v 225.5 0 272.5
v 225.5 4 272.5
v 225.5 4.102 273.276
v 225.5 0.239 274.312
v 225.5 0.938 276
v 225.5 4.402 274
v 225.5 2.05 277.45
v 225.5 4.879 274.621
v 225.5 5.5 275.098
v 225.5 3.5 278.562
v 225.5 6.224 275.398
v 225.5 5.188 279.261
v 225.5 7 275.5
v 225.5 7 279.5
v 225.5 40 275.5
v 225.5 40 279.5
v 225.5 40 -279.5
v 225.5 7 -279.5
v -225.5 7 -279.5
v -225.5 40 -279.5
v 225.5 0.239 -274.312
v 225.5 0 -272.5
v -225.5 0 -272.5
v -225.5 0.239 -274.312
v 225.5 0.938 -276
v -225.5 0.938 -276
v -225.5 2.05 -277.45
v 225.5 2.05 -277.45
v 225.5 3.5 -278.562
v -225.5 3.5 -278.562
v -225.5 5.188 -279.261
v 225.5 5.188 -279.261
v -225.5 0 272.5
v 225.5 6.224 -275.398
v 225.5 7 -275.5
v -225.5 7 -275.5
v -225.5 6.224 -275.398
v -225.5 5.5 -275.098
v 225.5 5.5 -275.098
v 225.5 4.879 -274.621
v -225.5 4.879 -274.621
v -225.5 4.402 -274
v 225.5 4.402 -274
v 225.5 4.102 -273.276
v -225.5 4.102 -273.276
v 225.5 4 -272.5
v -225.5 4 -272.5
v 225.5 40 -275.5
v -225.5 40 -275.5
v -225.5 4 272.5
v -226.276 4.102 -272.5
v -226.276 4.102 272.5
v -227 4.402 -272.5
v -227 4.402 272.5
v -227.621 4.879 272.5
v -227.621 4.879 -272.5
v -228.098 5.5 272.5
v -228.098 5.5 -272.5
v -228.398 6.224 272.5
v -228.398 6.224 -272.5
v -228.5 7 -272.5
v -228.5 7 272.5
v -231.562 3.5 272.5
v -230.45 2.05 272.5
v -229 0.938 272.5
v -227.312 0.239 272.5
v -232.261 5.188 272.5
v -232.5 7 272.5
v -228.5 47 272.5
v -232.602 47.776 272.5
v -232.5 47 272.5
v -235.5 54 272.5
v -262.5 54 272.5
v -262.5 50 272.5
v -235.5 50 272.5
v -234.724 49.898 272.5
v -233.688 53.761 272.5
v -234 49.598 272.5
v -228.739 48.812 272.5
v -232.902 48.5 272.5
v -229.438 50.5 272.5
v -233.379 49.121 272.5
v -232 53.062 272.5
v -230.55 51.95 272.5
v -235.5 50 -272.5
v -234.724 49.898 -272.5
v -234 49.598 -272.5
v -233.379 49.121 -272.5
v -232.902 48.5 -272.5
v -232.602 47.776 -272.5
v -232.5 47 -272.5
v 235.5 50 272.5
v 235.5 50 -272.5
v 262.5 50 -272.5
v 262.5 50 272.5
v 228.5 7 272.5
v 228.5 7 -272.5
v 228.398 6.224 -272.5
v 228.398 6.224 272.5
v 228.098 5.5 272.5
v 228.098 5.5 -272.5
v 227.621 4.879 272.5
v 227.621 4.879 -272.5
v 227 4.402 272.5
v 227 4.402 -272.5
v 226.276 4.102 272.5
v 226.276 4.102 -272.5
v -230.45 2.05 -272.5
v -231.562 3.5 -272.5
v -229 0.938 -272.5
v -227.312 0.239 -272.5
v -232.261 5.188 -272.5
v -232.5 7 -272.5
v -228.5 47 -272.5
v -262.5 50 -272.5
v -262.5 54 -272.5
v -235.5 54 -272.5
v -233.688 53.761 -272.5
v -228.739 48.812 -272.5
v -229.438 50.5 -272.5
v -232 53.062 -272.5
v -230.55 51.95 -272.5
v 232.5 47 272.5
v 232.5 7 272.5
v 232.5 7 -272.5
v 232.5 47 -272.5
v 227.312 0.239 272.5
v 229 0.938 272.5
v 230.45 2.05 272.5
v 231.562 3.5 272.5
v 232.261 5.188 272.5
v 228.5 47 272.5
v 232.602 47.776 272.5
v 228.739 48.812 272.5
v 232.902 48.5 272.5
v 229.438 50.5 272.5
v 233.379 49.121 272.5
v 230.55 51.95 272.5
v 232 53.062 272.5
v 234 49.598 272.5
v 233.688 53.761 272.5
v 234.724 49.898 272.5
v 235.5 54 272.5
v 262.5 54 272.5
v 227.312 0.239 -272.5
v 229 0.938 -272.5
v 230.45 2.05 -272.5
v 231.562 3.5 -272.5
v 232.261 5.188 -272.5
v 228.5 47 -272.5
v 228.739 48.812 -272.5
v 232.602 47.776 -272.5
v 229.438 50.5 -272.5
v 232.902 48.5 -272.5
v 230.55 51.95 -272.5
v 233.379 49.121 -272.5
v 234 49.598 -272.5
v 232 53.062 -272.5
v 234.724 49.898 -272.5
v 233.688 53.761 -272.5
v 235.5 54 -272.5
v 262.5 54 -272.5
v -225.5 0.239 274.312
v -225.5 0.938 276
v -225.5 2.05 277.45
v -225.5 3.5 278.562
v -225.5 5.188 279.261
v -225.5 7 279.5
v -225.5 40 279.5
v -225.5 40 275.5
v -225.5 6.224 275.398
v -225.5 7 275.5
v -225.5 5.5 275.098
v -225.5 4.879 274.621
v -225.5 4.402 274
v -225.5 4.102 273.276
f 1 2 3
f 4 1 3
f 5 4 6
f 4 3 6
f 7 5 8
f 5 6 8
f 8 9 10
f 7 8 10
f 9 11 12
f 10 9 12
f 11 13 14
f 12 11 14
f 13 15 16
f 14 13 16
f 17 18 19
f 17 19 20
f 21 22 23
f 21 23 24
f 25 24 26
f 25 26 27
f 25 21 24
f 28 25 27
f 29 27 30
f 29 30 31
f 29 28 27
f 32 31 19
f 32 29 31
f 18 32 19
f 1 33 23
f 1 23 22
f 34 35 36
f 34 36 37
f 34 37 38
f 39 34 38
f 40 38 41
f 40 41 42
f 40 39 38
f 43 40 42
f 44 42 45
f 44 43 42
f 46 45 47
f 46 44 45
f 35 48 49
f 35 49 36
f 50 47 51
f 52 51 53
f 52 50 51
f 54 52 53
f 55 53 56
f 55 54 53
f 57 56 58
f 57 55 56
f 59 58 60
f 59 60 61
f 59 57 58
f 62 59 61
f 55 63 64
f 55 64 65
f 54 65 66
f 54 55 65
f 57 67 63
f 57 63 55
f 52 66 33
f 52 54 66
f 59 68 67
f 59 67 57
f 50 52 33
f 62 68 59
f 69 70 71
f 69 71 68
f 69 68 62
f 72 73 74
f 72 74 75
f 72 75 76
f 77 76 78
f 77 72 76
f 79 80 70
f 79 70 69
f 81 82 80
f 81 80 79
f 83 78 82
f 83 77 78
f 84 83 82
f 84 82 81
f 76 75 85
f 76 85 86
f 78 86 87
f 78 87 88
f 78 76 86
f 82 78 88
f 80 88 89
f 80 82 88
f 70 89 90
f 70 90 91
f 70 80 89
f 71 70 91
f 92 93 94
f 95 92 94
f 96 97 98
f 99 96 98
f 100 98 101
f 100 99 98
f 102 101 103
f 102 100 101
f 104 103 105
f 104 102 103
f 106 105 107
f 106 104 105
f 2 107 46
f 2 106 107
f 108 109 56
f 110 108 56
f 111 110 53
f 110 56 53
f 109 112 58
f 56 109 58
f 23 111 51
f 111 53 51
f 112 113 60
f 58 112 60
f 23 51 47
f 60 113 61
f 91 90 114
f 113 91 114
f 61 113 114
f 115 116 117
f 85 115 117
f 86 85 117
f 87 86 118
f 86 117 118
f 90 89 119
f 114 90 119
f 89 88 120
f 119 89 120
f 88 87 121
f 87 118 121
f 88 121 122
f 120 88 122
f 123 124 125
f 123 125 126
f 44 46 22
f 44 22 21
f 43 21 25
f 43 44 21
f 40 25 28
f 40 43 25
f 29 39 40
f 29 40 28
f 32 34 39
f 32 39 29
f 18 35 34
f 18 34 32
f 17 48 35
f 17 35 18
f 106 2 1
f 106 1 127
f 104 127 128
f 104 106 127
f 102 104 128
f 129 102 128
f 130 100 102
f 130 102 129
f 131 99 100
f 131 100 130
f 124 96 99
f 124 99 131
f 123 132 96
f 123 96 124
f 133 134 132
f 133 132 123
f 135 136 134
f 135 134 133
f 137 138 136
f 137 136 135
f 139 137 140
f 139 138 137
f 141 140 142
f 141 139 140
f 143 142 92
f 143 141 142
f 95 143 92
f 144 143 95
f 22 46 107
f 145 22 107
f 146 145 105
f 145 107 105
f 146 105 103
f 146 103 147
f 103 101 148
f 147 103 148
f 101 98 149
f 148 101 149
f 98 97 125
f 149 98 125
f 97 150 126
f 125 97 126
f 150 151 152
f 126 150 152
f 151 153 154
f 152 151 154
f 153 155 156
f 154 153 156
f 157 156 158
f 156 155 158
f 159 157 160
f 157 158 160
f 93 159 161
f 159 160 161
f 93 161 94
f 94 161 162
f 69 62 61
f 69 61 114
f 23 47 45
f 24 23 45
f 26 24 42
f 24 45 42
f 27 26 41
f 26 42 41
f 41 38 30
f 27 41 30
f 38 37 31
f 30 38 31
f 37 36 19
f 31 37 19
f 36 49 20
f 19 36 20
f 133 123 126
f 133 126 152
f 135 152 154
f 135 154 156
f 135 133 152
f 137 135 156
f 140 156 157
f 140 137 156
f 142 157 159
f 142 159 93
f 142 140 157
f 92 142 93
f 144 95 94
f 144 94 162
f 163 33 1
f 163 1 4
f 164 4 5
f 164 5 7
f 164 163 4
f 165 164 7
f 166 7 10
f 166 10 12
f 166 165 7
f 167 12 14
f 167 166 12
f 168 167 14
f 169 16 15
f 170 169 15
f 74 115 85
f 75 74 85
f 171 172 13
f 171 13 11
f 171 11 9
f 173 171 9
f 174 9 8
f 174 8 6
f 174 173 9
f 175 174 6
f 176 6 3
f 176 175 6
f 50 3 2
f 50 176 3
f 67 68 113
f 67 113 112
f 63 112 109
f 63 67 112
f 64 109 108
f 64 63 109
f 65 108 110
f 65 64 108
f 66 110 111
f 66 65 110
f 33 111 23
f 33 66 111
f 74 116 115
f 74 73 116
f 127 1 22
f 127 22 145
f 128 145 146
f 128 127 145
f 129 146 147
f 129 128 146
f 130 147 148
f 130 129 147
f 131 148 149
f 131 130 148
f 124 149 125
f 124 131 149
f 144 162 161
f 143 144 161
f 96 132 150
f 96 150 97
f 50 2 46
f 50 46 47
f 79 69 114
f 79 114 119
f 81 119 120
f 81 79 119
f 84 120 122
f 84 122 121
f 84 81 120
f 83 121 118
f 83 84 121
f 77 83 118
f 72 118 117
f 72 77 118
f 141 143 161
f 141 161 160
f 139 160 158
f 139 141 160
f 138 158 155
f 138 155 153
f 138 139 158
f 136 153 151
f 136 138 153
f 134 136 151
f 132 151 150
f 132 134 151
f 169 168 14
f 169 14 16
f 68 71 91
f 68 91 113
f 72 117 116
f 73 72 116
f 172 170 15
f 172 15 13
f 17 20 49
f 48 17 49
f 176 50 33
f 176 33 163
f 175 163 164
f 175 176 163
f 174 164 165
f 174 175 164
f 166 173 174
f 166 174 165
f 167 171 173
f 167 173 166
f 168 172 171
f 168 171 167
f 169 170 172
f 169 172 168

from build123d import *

# Parameters (mm, degrees)
BASE_FLANGIA1_DEPTH       = 272.5
BORDO_FLANGIA1_DEPTH      = 451
BORDO_FLANGIA1_BEND_DEPTH = 451


# Sheet-metal steps are written as plain solids
with BuildPart() as part:
    # Schizzo1 → Base-Flangia1 (new, symmetric)
    with BuildSketch(Plane.XY):
        with BuildLine():
            Line((-262.5, 50), (-235.5, 50))
            ThreePointArc((-235.5, 50), (-233.378679656, 49.121320344), (-232.5, 47))
            Line((-232.5, 47), (-232.5, 7))
            ThreePointArc((-232.5, 7), (-230.449747468, 2.050252532), (-225.5, 0))
            Line((-225.5, 0), (225.5, 0))
            ThreePointArc((225.5, 0), (230.449747468, 2.050252532), (232.5, 7))
            Line((232.5, 7), (232.5, 47))
            ThreePointArc((232.5, 47), (233.378679656, 49.121320344), (235.5, 50))
            Line((235.5, 50), (262.5, 50))
            Line((262.5, 50), (262.5, 54))
            Line((262.5, 54), (235.5, 54))
            ThreePointArc((235.5, 54), (230.550252532, 51.949747468), (228.5, 47))
            Line((228.5, 47), (228.5, 7))
            ThreePointArc((228.5, 7), (227.621320344, 4.878679656), (225.5, 4))
            Line((225.5, 4), (-225.5, 4))
            ThreePointArc((-225.5, 4), (-227.621320344, 4.878679656), (-228.5, 7))
            Line((-228.5, 7), (-228.5, 47))
            ThreePointArc((-228.5, 47), (-230.550252532, 51.949747468), (-235.5, 54))
            Line((-235.5, 54), (-262.5, 54))
            Line((-262.5, 54), (-262.5, 50))
        make_face()
    extrude(amount=BASE_FLANGIA1_DEPTH, both=True)

    # Bordo-Flangia1 section (across the edge) → Bordo-Flangia1 (add)
    with BuildSketch(Plane(origin=(-225.5, 4, 275.5), x_dir=(0, 0, -1), z_dir=(1, 0, 0))):
        with BuildLine():
            Line((-4, 3), (-4, 36))
            Line((-4, 36), (0, 36))
            Line((0, 36), (0, 3))
            ThreePointArc((0, 3), (0.878679656, 0.878679656), (3, 0))
            Line((3, 0), (3, -4))
            ThreePointArc((3, -4), (-1.949747468, -1.949747468), (-4, 3))
        make_face()
    extrude(amount=BORDO_FLANGIA1_DEPTH)

    # Bordo-Flangia1 section 2 (across the edge) → Bordo-Flangia1 bend (add)
    with BuildSketch(Plane(origin=(225.5, 4, -275.5), x_dir=(0, 0, 1), z_dir=(-1, 0, 0))):
        with BuildLine():
            Line((-4, 3), (-4, 36))
            Line((-4, 36), (0, 36))
            Line((0, 36), (0, 3))
            ThreePointArc((0, 3), (0.878679656, 0.878679656), (3, 0))
            Line((3, 0), (3, -4))
            ThreePointArc((3, -4), (-1.949747468, -1.949747468), (-4, 3))
        make_face()
    extrude(amount=BORDO_FLANGIA1_BEND_DEPTH)


solid = part.part
